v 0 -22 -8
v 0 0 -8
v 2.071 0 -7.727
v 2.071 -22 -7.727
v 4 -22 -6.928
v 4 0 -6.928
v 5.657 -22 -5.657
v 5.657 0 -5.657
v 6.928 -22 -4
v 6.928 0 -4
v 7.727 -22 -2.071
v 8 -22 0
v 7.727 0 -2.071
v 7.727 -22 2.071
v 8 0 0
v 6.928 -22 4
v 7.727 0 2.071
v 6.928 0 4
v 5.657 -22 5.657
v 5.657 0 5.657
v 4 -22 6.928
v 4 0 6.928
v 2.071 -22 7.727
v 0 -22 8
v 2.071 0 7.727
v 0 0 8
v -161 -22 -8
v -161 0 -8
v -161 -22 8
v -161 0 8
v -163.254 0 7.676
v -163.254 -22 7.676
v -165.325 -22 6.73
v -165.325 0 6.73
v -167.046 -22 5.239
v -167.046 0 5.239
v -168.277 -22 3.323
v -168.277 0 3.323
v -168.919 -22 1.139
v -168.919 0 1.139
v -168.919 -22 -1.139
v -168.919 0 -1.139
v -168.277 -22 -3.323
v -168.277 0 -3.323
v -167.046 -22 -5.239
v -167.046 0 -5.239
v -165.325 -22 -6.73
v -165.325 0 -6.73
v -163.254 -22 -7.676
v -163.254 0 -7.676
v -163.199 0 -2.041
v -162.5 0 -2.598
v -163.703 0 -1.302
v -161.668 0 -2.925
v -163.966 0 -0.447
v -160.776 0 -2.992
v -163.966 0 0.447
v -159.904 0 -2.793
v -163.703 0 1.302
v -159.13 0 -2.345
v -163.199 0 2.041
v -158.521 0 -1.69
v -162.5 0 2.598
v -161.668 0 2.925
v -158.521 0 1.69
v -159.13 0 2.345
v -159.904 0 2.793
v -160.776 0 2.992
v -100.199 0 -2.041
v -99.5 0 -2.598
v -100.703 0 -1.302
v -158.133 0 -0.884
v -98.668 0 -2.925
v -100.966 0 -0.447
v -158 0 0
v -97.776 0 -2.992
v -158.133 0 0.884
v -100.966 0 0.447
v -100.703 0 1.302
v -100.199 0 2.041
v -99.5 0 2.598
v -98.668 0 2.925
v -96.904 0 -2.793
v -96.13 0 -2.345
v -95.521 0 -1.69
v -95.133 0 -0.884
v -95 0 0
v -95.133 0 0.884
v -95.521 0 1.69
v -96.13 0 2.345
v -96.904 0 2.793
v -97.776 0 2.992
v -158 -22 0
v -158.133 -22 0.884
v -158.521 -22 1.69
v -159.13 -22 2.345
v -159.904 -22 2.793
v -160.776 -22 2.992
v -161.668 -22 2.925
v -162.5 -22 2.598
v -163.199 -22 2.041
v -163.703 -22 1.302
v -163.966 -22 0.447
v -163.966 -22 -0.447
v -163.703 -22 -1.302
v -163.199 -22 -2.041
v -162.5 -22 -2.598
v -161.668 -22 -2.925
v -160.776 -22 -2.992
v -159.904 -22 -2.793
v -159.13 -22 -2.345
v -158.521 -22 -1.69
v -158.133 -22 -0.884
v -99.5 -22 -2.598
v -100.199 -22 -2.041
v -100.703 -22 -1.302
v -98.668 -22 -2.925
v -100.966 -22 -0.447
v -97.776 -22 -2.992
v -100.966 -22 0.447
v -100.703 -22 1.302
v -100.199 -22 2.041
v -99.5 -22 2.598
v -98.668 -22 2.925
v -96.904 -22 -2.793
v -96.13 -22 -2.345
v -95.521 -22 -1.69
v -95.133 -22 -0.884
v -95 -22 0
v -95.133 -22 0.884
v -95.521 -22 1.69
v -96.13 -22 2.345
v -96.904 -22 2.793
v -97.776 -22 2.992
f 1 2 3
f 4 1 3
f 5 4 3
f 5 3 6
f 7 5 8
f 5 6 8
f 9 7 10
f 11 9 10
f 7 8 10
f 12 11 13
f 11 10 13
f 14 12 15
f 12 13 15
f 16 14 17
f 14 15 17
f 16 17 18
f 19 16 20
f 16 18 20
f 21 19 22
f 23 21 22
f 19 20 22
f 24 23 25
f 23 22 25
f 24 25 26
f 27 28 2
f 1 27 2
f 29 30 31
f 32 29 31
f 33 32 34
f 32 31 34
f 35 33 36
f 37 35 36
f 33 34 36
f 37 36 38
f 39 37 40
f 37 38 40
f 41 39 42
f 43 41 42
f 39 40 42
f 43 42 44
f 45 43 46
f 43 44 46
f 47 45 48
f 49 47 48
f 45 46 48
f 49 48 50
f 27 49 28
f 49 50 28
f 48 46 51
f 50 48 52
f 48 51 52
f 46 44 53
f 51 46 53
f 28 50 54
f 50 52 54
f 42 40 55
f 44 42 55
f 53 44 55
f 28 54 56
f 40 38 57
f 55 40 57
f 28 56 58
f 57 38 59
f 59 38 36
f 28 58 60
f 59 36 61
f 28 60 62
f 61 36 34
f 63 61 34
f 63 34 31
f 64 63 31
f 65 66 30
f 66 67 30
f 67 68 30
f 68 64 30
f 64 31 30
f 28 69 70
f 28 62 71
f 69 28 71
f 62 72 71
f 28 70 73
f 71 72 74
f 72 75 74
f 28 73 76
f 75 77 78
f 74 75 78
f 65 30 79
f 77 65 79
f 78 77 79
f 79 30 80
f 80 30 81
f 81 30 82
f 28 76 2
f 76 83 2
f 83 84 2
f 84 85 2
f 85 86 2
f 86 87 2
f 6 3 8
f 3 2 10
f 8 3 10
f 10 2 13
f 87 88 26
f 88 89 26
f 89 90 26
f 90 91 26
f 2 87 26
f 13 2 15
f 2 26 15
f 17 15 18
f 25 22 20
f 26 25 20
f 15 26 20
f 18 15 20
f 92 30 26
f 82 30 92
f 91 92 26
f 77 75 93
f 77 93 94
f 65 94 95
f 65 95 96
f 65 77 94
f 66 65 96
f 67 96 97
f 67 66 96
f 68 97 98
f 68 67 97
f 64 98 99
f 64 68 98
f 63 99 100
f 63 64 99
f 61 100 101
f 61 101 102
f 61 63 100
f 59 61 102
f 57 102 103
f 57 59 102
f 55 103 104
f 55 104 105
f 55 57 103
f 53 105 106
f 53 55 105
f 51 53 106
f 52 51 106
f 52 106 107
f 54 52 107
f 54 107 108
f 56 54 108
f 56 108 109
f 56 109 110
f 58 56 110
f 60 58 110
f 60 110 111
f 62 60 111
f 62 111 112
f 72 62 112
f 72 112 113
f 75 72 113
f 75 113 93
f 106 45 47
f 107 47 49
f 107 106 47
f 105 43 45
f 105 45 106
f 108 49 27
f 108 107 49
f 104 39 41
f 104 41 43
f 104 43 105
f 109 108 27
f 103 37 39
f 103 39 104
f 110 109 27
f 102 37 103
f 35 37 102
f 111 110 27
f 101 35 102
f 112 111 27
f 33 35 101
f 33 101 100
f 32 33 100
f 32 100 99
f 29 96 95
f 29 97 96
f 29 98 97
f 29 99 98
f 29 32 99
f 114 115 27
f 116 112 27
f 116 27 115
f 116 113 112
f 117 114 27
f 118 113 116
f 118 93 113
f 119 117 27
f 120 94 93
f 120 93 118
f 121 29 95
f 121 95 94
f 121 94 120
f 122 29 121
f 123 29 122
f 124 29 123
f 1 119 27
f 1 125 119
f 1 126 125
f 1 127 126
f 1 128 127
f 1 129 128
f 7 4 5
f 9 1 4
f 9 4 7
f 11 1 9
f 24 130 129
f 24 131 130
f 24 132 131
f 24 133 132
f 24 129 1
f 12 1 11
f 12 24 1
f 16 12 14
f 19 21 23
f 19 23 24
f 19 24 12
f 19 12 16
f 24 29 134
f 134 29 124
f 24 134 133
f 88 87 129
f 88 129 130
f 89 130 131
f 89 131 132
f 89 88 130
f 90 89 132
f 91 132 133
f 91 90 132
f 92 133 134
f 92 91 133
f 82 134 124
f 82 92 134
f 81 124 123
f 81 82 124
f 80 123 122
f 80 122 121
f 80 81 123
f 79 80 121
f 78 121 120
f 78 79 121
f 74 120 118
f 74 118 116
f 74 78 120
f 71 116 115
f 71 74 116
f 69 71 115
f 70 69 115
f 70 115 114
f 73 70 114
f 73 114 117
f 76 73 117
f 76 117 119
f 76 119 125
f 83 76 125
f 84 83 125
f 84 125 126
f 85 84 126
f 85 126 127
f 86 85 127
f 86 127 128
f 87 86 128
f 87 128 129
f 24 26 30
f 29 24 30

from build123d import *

# Parameters (mm, degrees)
F0_W     = 8
F0_H     = 16
F0_W_2   = 24
F0_R     = 3
F0_W_3   = 35
F1_DEPTH = 6
F2_DEPTH = 22


with BuildPart() as f1:
    # F0 (on Front) → F1 (new body)
    with BuildSketch(Plane.XZ):
        with BuildLine():
            ThreePointArc((0, -8), (5.6568542495, -5.6568542495), (8, 0))
            ThreePointArc((8, 0), (5.6568542495, 5.6568542495), (0, 8))
            Line((0, 8), (0, -8))
        make_face()
        with BuildLine():
            Line((0, -8), (0, 8))
            ThreePointArc((0, 8), (-8, 0), (0, -8))
        make_face()
        with BuildLine():
            ThreePointArc((0, -8), (-8, 0), (0, 8))
            Line((0, 8), (-72, 8))
            Line((-72, 8), (-72, -8))
            Line((-72, -8), (0, -8))
        make_face()
        with Locations((-76, 0)):
            Rectangle(F0_W, F0_H)
        with Locations((-92, 0)):
            Rectangle(F0_W_2, F0_H)
        with Locations((-98, 0)):
            Circle(F0_R, mode=Mode.SUBTRACT)
        with Locations((-108, 0)):
            Rectangle(F0_W, F0_H)
        with Locations((-129.5, 0)):
            Rectangle(F0_W_3, F0_H)
        with Locations((-151, 0)):
            Rectangle(F0_W, F0_H)
        with BuildLine():
            Line((-155, -8), (-155, 8))
            Line((-155, 8), (-161, 8))
            ThreePointArc((-161, 8), (-169, 0), (-161, -8))
            Line((-161, -8), (-155, -8))
        make_face()
        with Locations((-161, 0)):
            Circle(F0_R, mode=Mode.SUBTRACT)
    extrude(amount=F1_DEPTH)

    # F0 (on Front) → F2 (join)
    with BuildSketch(Plane.XZ):
        with BuildLine():
            ThreePointArc((0, -8), (5.6568542495, -5.6568542495), (8, 0))
            ThreePointArc((8, 0), (5.6568542495, 5.6568542495), (0, 8))
            Line((0, 8), (0, -8))
        make_face()
        with BuildLine():
            Line((0, -8), (0, 8))
            ThreePointArc((0, 8), (-8, 0), (0, -8))
        make_face()
        with BuildLine():
            ThreePointArc((0, -8), (-8, 0), (0, 8))
            Line((0, 8), (-72, 8))
            Line((-72, 8), (-72, -8))
            Line((-72, -8), (0, -8))
        make_face()
        with Locations((-76, 0)):
            Rectangle(F0_W, F0_H)
        with Locations((-92, 0)):
            Rectangle(F0_W_2, F0_H)
        with Locations((-98, 0)):
            Circle(F0_R, mode=Mode.SUBTRACT)
        with Locations((-108, 0)):
            Rectangle(F0_W, F0_H)
        with Locations((-129.5, 0)):
            Rectangle(F0_W_3, F0_H)
        with Locations((-151, 0)):
            Rectangle(F0_W, F0_H)
        with BuildLine():
            Line((-155, -8), (-155, 8))
            Line((-155, 8), (-161, 8))
            ThreePointArc((-161, 8), (-169, 0), (-161, -8))
            Line((-161, -8), (-155, -8))
        make_face()
        with Locations((-161, 0)):
            Circle(F0_R, mode=Mode.SUBTRACT)
    extrude(amount=F2_DEPTH)


solid = f1.part
